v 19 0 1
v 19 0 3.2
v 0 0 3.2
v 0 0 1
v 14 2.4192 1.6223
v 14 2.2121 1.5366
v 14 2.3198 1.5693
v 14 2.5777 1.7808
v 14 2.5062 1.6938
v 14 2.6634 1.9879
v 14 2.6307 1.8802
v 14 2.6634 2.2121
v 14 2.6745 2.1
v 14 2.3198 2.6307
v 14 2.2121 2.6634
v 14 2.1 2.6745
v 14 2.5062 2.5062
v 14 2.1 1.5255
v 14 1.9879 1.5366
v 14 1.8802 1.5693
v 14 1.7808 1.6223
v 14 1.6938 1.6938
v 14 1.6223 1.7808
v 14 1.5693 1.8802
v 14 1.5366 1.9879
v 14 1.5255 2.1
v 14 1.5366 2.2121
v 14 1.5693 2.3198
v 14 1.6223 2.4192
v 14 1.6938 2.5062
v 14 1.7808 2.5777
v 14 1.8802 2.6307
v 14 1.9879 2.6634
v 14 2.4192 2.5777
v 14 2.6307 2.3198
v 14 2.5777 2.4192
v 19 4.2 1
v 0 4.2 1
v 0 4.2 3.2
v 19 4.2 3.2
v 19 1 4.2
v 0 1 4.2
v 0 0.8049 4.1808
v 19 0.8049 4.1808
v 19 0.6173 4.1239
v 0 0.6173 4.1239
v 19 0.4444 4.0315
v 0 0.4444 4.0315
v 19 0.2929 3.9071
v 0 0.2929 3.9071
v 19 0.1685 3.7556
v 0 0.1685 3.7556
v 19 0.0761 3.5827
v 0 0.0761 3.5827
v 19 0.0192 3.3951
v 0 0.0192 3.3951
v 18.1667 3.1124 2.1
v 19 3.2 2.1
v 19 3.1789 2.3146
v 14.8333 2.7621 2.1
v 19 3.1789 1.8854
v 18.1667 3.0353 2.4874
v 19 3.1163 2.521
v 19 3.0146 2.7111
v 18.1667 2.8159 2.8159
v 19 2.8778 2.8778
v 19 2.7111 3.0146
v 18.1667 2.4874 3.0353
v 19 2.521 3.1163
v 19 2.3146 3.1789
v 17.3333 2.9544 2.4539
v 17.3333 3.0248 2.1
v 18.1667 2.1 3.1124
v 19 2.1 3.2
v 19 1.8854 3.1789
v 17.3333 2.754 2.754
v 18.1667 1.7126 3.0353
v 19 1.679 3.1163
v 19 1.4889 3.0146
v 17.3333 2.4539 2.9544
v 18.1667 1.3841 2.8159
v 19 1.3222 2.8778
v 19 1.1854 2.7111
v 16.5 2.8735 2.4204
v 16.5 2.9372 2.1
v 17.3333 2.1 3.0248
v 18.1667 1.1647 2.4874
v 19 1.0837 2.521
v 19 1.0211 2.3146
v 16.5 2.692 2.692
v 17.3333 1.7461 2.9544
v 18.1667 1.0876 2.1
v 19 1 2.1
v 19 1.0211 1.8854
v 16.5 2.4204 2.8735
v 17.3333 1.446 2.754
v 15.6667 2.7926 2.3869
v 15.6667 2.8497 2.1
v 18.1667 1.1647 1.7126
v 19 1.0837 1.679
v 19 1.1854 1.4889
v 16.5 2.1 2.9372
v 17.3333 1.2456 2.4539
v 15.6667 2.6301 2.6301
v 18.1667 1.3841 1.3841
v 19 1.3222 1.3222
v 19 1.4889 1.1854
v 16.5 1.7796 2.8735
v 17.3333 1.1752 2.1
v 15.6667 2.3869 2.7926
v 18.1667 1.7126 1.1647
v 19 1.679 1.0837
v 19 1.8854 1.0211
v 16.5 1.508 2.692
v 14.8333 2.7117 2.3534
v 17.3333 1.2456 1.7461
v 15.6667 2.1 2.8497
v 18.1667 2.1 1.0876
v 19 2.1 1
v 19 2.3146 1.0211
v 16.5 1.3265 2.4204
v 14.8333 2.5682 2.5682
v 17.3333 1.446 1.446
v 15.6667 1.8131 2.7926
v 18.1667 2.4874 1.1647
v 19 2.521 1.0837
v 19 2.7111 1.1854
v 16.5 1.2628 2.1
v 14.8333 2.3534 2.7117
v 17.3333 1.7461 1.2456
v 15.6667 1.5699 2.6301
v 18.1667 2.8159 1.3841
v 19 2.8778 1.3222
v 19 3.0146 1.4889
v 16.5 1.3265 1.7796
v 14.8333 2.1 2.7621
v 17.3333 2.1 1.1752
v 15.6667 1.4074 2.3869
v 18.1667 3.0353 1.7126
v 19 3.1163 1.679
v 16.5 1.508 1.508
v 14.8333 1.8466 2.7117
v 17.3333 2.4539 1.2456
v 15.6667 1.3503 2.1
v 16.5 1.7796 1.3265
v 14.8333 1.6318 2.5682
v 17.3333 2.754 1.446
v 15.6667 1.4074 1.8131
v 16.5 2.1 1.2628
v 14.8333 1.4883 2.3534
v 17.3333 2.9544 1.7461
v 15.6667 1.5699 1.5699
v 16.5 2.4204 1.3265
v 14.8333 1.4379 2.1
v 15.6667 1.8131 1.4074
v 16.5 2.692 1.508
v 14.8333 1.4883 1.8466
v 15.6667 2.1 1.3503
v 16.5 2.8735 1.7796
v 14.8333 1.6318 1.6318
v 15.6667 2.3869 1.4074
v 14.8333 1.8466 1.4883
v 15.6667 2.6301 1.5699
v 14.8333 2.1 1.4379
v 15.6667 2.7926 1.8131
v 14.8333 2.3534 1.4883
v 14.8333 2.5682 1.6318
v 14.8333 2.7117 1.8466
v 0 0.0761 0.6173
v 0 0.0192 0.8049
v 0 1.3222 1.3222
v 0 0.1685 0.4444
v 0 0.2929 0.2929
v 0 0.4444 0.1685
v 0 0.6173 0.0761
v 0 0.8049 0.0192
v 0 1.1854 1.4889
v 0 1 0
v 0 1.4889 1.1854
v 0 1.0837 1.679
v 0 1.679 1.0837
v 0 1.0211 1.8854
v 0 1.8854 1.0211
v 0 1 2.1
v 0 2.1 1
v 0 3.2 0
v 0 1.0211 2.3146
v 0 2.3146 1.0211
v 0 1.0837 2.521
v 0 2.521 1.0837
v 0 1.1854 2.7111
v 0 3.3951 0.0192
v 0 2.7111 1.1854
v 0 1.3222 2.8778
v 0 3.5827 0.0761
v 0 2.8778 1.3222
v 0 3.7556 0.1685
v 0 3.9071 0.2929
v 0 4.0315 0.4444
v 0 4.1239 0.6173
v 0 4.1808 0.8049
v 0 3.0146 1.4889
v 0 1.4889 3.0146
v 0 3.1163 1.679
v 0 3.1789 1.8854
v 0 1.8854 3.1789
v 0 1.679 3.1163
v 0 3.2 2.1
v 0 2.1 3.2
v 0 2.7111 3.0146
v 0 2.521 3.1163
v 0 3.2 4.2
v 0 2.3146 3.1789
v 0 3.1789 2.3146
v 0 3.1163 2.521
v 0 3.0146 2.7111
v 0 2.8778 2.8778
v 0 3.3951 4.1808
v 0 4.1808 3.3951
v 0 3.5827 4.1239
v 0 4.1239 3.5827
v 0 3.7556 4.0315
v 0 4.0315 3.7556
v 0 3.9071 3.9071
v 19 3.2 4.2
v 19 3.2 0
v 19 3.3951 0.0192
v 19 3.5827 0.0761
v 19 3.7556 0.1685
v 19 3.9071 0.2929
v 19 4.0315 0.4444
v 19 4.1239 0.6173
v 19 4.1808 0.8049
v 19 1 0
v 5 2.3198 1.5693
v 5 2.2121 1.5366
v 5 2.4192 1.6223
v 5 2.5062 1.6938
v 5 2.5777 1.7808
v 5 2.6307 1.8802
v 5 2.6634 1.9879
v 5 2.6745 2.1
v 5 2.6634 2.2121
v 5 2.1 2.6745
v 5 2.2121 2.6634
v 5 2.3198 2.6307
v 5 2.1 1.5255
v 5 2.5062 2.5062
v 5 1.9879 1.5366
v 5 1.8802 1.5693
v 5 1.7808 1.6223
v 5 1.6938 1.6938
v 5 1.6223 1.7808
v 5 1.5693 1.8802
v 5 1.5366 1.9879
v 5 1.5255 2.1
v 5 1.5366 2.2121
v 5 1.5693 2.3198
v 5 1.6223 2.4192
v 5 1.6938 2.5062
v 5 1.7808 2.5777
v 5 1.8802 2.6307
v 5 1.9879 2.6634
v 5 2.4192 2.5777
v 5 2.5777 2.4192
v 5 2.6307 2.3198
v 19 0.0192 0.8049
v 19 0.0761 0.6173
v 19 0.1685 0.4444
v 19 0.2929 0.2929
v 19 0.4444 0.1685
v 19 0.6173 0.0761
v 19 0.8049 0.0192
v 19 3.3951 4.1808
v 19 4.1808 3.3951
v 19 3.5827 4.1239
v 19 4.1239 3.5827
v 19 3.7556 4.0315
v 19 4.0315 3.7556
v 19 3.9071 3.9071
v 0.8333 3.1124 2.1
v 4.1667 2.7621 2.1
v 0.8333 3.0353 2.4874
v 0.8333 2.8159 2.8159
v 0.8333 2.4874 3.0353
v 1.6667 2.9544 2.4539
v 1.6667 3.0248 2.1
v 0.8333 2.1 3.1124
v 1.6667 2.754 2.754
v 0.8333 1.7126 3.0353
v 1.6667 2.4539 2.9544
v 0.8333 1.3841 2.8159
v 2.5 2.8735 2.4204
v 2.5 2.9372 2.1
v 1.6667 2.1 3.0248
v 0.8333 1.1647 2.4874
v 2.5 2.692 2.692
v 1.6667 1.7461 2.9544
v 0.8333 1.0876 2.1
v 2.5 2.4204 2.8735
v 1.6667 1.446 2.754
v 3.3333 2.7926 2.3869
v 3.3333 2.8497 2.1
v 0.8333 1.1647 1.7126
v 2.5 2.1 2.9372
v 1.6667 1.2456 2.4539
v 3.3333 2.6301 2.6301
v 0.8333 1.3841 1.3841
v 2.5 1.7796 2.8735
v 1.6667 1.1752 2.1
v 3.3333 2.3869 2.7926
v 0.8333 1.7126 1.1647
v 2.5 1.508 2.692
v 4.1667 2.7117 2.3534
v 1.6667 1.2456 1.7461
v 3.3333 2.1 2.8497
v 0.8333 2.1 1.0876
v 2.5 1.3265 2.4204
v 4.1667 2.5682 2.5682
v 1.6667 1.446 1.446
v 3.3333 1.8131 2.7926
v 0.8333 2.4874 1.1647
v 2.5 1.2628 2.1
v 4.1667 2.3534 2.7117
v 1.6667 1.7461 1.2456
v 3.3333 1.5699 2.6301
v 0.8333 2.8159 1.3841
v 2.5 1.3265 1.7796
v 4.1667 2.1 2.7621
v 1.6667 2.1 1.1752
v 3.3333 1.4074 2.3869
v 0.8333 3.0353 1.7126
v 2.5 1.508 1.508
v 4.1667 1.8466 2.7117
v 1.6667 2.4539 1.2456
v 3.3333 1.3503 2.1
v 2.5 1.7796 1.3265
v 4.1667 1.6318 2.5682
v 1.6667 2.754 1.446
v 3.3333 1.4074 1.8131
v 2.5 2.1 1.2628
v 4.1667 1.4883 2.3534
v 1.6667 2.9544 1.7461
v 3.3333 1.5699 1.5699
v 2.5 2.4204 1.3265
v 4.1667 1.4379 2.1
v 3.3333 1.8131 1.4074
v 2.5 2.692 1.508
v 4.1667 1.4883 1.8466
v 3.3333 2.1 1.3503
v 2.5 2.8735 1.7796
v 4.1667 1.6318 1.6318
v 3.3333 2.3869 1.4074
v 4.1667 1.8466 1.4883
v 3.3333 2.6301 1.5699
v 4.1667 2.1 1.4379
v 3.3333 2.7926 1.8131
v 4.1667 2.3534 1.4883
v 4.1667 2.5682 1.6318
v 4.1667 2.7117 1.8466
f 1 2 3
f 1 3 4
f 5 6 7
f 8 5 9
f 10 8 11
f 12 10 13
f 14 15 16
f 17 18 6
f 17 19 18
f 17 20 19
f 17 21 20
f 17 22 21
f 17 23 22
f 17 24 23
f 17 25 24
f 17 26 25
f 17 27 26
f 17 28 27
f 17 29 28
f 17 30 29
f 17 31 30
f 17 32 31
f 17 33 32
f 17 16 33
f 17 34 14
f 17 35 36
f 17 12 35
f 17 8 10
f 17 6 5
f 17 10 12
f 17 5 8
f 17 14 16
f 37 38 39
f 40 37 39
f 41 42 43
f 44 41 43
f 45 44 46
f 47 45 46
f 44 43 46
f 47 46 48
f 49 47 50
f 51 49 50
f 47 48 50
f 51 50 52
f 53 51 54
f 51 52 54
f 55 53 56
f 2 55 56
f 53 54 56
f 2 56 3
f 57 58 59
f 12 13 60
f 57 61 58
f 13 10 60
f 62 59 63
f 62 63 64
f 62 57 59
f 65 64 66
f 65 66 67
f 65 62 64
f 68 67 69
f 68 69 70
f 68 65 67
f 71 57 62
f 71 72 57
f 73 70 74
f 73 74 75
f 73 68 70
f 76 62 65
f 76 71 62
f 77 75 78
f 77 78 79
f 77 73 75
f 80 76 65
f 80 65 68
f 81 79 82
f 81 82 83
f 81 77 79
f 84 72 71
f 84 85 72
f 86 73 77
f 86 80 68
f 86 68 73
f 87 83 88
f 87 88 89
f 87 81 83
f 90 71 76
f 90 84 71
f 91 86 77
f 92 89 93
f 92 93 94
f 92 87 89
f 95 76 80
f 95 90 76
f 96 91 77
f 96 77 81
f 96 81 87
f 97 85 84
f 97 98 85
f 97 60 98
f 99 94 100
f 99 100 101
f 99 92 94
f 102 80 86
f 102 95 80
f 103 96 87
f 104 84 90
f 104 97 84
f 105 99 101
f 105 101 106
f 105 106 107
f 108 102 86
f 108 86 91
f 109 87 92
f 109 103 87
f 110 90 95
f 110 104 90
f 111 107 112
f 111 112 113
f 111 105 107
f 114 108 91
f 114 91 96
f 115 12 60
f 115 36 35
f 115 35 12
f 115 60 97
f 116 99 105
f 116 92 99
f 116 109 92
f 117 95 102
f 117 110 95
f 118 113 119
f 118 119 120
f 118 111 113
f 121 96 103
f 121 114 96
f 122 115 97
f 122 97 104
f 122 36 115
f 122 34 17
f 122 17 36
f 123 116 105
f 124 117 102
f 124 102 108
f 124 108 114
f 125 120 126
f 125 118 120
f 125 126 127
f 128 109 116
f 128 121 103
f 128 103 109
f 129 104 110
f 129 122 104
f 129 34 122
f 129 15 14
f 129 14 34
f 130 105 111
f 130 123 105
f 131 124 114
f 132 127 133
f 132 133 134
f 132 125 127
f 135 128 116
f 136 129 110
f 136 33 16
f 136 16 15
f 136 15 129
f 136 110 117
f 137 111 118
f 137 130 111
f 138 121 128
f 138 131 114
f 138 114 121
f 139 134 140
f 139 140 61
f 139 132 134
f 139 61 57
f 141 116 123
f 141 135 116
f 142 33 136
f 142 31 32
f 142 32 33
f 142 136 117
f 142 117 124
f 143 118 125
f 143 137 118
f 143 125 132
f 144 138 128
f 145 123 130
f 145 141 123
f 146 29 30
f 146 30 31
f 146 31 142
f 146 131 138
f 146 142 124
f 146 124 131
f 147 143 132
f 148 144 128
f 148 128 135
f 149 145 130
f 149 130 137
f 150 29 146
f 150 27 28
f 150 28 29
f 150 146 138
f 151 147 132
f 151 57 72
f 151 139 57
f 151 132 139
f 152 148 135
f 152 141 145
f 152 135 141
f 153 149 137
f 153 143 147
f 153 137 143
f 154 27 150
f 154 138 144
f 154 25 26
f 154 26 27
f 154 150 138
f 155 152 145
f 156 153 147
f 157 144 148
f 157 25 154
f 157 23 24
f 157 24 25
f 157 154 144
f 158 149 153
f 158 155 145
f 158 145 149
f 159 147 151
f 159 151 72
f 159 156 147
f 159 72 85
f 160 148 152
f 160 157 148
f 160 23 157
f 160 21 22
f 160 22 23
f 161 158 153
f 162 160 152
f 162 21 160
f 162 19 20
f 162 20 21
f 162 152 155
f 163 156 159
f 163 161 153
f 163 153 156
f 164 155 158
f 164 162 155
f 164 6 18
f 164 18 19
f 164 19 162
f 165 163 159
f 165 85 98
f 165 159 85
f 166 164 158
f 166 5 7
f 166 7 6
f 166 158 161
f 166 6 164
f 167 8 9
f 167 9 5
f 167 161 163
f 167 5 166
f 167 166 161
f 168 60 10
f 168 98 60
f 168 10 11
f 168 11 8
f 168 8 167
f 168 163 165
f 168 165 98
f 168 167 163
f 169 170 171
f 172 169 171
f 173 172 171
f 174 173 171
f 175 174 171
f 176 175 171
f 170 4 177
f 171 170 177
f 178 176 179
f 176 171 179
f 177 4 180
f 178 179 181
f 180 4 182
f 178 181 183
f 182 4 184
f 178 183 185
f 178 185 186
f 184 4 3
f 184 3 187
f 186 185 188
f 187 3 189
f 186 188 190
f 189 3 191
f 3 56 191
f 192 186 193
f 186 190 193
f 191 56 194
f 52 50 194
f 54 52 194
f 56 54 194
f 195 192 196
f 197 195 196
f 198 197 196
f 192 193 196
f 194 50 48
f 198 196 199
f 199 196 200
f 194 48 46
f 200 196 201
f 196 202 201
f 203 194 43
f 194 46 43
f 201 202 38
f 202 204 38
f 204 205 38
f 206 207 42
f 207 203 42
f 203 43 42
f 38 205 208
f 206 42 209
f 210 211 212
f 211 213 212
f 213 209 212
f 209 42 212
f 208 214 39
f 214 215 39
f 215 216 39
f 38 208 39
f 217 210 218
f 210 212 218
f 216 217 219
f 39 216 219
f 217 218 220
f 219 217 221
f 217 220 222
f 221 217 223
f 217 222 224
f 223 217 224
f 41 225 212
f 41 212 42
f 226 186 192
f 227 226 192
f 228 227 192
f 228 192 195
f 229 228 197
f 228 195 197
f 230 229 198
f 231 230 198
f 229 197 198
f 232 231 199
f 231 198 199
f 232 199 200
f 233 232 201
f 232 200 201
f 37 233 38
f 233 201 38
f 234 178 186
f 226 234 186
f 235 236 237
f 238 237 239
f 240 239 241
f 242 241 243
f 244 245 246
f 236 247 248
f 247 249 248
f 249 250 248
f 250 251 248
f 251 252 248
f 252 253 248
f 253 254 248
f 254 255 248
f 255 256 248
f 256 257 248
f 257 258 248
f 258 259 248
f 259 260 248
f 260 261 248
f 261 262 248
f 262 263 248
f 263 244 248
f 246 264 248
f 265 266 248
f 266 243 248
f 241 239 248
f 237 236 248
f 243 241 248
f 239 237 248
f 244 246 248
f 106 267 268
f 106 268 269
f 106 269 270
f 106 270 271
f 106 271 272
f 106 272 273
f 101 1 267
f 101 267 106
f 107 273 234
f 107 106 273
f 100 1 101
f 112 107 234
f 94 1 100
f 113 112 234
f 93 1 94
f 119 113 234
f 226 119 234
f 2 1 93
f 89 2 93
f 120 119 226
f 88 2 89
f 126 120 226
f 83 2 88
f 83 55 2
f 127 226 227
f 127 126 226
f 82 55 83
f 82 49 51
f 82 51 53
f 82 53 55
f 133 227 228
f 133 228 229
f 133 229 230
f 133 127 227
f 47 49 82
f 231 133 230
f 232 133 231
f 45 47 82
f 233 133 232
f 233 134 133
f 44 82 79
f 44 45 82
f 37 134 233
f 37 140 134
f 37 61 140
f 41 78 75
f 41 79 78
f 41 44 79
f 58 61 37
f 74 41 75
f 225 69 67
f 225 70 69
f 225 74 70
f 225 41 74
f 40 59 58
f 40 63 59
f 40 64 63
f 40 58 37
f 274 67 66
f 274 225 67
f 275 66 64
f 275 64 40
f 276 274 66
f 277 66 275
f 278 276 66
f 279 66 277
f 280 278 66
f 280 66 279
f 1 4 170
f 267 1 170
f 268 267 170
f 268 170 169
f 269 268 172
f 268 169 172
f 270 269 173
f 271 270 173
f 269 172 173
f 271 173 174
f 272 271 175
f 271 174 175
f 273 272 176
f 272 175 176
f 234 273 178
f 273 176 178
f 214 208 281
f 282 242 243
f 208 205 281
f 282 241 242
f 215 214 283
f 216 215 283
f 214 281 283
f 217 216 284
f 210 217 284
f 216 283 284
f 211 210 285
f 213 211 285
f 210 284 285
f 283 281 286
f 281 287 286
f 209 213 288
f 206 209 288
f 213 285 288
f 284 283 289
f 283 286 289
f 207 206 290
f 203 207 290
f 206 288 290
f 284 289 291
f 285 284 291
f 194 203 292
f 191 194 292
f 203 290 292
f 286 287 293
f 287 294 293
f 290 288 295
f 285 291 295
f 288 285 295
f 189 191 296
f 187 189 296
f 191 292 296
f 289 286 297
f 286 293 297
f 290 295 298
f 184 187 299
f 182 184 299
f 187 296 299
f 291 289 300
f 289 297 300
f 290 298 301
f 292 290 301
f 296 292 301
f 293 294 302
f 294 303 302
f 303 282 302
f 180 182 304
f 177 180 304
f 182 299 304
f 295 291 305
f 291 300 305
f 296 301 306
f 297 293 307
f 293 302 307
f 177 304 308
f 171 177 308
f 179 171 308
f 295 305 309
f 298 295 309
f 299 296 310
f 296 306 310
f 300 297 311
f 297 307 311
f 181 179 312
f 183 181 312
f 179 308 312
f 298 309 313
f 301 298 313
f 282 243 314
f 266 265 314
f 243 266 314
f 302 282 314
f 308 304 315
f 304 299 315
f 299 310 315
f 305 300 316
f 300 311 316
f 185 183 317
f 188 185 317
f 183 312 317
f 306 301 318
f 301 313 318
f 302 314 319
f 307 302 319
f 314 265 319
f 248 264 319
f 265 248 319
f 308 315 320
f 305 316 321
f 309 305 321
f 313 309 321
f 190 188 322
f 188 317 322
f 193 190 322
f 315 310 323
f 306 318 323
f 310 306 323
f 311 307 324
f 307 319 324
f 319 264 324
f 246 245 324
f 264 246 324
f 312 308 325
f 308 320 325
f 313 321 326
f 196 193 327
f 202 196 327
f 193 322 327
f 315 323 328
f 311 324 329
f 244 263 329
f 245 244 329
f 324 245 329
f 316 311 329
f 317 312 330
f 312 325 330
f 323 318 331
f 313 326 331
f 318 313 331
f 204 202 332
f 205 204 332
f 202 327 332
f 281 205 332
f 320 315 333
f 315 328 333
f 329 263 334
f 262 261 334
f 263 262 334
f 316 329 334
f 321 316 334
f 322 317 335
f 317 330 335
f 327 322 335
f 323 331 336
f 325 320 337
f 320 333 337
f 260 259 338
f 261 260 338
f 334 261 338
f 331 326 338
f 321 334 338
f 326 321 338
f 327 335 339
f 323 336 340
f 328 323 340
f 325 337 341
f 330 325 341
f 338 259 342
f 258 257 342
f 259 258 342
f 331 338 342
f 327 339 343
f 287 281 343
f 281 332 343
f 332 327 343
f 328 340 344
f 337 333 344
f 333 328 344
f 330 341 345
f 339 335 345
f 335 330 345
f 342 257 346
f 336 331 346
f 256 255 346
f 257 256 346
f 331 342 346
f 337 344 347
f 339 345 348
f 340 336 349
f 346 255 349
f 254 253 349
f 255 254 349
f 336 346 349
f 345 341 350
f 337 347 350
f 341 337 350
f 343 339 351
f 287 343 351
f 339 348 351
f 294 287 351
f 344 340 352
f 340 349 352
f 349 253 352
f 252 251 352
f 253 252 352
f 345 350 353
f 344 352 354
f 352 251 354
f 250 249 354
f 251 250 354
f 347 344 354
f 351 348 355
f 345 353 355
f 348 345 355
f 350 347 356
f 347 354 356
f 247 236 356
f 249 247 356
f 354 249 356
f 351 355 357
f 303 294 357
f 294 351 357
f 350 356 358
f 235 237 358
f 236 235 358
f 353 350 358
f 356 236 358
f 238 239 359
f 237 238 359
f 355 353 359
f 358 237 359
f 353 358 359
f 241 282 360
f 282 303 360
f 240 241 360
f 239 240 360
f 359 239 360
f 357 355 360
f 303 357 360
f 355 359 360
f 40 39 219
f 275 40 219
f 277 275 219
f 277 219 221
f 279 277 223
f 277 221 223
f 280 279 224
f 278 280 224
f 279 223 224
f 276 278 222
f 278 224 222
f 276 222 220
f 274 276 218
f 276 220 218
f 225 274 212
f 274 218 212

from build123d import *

# Parameters (mm, degrees)
BOSS_EXTRUDE1_DEPTH = 19
SKETCH1_3_R         = 1.1
CUT_EXTRUDE1_DEPTH  = 5
CUT_EXTRUDE1_TAPER  = 6


with BuildPart() as part:
    # Sketch1 → Boss-Extrude1 (new body)
    with BuildSketch(Plane.YZ):
        with BuildLine():
            Line((1, 0), (3.2, 0))
            ThreePointArc((3.2, 0), (3.907106781, 0.292893219), (4.2, 1))
            Line((4.2, 1), (4.2, 3.2))
            ThreePointArc((4.2, 3.2), (3.907106781, 3.907106781), (3.2, 4.2))
            Line((3.2, 4.2), (1, 4.2))
            ThreePointArc((1, 4.2), (0.292893219, 3.907106781), (0, 3.2))
            Line((0, 3.2), (0, 1))
            ThreePointArc((0, 1), (0.292893219, 0.292893219), (1, 0))
        make_face()
    extrude(amount=BOSS_EXTRUDE1_DEPTH)

    # Sketch1<3> → Cut-Extrude1 (cut)
    with BuildSketch(Plane.YZ):
        with Locations((2.1, 2.1)):
            Circle(SKETCH1_3_R)
    cut_extrude1 = extrude(amount=CUT_EXTRUDE1_DEPTH, taper=CUT_EXTRUDE1_TAPER, mode=Mode.SUBTRACT)

    # Mirror1: Cut-Extrude1 across plane
    add(cut_extrude1.mirror(Plane(origin=(9.5, 0, 0), x_dir=(0, 0, 1), z_dir=(1, 0, 0))), mode=Mode.SUBTRACT)


solid = part.part
